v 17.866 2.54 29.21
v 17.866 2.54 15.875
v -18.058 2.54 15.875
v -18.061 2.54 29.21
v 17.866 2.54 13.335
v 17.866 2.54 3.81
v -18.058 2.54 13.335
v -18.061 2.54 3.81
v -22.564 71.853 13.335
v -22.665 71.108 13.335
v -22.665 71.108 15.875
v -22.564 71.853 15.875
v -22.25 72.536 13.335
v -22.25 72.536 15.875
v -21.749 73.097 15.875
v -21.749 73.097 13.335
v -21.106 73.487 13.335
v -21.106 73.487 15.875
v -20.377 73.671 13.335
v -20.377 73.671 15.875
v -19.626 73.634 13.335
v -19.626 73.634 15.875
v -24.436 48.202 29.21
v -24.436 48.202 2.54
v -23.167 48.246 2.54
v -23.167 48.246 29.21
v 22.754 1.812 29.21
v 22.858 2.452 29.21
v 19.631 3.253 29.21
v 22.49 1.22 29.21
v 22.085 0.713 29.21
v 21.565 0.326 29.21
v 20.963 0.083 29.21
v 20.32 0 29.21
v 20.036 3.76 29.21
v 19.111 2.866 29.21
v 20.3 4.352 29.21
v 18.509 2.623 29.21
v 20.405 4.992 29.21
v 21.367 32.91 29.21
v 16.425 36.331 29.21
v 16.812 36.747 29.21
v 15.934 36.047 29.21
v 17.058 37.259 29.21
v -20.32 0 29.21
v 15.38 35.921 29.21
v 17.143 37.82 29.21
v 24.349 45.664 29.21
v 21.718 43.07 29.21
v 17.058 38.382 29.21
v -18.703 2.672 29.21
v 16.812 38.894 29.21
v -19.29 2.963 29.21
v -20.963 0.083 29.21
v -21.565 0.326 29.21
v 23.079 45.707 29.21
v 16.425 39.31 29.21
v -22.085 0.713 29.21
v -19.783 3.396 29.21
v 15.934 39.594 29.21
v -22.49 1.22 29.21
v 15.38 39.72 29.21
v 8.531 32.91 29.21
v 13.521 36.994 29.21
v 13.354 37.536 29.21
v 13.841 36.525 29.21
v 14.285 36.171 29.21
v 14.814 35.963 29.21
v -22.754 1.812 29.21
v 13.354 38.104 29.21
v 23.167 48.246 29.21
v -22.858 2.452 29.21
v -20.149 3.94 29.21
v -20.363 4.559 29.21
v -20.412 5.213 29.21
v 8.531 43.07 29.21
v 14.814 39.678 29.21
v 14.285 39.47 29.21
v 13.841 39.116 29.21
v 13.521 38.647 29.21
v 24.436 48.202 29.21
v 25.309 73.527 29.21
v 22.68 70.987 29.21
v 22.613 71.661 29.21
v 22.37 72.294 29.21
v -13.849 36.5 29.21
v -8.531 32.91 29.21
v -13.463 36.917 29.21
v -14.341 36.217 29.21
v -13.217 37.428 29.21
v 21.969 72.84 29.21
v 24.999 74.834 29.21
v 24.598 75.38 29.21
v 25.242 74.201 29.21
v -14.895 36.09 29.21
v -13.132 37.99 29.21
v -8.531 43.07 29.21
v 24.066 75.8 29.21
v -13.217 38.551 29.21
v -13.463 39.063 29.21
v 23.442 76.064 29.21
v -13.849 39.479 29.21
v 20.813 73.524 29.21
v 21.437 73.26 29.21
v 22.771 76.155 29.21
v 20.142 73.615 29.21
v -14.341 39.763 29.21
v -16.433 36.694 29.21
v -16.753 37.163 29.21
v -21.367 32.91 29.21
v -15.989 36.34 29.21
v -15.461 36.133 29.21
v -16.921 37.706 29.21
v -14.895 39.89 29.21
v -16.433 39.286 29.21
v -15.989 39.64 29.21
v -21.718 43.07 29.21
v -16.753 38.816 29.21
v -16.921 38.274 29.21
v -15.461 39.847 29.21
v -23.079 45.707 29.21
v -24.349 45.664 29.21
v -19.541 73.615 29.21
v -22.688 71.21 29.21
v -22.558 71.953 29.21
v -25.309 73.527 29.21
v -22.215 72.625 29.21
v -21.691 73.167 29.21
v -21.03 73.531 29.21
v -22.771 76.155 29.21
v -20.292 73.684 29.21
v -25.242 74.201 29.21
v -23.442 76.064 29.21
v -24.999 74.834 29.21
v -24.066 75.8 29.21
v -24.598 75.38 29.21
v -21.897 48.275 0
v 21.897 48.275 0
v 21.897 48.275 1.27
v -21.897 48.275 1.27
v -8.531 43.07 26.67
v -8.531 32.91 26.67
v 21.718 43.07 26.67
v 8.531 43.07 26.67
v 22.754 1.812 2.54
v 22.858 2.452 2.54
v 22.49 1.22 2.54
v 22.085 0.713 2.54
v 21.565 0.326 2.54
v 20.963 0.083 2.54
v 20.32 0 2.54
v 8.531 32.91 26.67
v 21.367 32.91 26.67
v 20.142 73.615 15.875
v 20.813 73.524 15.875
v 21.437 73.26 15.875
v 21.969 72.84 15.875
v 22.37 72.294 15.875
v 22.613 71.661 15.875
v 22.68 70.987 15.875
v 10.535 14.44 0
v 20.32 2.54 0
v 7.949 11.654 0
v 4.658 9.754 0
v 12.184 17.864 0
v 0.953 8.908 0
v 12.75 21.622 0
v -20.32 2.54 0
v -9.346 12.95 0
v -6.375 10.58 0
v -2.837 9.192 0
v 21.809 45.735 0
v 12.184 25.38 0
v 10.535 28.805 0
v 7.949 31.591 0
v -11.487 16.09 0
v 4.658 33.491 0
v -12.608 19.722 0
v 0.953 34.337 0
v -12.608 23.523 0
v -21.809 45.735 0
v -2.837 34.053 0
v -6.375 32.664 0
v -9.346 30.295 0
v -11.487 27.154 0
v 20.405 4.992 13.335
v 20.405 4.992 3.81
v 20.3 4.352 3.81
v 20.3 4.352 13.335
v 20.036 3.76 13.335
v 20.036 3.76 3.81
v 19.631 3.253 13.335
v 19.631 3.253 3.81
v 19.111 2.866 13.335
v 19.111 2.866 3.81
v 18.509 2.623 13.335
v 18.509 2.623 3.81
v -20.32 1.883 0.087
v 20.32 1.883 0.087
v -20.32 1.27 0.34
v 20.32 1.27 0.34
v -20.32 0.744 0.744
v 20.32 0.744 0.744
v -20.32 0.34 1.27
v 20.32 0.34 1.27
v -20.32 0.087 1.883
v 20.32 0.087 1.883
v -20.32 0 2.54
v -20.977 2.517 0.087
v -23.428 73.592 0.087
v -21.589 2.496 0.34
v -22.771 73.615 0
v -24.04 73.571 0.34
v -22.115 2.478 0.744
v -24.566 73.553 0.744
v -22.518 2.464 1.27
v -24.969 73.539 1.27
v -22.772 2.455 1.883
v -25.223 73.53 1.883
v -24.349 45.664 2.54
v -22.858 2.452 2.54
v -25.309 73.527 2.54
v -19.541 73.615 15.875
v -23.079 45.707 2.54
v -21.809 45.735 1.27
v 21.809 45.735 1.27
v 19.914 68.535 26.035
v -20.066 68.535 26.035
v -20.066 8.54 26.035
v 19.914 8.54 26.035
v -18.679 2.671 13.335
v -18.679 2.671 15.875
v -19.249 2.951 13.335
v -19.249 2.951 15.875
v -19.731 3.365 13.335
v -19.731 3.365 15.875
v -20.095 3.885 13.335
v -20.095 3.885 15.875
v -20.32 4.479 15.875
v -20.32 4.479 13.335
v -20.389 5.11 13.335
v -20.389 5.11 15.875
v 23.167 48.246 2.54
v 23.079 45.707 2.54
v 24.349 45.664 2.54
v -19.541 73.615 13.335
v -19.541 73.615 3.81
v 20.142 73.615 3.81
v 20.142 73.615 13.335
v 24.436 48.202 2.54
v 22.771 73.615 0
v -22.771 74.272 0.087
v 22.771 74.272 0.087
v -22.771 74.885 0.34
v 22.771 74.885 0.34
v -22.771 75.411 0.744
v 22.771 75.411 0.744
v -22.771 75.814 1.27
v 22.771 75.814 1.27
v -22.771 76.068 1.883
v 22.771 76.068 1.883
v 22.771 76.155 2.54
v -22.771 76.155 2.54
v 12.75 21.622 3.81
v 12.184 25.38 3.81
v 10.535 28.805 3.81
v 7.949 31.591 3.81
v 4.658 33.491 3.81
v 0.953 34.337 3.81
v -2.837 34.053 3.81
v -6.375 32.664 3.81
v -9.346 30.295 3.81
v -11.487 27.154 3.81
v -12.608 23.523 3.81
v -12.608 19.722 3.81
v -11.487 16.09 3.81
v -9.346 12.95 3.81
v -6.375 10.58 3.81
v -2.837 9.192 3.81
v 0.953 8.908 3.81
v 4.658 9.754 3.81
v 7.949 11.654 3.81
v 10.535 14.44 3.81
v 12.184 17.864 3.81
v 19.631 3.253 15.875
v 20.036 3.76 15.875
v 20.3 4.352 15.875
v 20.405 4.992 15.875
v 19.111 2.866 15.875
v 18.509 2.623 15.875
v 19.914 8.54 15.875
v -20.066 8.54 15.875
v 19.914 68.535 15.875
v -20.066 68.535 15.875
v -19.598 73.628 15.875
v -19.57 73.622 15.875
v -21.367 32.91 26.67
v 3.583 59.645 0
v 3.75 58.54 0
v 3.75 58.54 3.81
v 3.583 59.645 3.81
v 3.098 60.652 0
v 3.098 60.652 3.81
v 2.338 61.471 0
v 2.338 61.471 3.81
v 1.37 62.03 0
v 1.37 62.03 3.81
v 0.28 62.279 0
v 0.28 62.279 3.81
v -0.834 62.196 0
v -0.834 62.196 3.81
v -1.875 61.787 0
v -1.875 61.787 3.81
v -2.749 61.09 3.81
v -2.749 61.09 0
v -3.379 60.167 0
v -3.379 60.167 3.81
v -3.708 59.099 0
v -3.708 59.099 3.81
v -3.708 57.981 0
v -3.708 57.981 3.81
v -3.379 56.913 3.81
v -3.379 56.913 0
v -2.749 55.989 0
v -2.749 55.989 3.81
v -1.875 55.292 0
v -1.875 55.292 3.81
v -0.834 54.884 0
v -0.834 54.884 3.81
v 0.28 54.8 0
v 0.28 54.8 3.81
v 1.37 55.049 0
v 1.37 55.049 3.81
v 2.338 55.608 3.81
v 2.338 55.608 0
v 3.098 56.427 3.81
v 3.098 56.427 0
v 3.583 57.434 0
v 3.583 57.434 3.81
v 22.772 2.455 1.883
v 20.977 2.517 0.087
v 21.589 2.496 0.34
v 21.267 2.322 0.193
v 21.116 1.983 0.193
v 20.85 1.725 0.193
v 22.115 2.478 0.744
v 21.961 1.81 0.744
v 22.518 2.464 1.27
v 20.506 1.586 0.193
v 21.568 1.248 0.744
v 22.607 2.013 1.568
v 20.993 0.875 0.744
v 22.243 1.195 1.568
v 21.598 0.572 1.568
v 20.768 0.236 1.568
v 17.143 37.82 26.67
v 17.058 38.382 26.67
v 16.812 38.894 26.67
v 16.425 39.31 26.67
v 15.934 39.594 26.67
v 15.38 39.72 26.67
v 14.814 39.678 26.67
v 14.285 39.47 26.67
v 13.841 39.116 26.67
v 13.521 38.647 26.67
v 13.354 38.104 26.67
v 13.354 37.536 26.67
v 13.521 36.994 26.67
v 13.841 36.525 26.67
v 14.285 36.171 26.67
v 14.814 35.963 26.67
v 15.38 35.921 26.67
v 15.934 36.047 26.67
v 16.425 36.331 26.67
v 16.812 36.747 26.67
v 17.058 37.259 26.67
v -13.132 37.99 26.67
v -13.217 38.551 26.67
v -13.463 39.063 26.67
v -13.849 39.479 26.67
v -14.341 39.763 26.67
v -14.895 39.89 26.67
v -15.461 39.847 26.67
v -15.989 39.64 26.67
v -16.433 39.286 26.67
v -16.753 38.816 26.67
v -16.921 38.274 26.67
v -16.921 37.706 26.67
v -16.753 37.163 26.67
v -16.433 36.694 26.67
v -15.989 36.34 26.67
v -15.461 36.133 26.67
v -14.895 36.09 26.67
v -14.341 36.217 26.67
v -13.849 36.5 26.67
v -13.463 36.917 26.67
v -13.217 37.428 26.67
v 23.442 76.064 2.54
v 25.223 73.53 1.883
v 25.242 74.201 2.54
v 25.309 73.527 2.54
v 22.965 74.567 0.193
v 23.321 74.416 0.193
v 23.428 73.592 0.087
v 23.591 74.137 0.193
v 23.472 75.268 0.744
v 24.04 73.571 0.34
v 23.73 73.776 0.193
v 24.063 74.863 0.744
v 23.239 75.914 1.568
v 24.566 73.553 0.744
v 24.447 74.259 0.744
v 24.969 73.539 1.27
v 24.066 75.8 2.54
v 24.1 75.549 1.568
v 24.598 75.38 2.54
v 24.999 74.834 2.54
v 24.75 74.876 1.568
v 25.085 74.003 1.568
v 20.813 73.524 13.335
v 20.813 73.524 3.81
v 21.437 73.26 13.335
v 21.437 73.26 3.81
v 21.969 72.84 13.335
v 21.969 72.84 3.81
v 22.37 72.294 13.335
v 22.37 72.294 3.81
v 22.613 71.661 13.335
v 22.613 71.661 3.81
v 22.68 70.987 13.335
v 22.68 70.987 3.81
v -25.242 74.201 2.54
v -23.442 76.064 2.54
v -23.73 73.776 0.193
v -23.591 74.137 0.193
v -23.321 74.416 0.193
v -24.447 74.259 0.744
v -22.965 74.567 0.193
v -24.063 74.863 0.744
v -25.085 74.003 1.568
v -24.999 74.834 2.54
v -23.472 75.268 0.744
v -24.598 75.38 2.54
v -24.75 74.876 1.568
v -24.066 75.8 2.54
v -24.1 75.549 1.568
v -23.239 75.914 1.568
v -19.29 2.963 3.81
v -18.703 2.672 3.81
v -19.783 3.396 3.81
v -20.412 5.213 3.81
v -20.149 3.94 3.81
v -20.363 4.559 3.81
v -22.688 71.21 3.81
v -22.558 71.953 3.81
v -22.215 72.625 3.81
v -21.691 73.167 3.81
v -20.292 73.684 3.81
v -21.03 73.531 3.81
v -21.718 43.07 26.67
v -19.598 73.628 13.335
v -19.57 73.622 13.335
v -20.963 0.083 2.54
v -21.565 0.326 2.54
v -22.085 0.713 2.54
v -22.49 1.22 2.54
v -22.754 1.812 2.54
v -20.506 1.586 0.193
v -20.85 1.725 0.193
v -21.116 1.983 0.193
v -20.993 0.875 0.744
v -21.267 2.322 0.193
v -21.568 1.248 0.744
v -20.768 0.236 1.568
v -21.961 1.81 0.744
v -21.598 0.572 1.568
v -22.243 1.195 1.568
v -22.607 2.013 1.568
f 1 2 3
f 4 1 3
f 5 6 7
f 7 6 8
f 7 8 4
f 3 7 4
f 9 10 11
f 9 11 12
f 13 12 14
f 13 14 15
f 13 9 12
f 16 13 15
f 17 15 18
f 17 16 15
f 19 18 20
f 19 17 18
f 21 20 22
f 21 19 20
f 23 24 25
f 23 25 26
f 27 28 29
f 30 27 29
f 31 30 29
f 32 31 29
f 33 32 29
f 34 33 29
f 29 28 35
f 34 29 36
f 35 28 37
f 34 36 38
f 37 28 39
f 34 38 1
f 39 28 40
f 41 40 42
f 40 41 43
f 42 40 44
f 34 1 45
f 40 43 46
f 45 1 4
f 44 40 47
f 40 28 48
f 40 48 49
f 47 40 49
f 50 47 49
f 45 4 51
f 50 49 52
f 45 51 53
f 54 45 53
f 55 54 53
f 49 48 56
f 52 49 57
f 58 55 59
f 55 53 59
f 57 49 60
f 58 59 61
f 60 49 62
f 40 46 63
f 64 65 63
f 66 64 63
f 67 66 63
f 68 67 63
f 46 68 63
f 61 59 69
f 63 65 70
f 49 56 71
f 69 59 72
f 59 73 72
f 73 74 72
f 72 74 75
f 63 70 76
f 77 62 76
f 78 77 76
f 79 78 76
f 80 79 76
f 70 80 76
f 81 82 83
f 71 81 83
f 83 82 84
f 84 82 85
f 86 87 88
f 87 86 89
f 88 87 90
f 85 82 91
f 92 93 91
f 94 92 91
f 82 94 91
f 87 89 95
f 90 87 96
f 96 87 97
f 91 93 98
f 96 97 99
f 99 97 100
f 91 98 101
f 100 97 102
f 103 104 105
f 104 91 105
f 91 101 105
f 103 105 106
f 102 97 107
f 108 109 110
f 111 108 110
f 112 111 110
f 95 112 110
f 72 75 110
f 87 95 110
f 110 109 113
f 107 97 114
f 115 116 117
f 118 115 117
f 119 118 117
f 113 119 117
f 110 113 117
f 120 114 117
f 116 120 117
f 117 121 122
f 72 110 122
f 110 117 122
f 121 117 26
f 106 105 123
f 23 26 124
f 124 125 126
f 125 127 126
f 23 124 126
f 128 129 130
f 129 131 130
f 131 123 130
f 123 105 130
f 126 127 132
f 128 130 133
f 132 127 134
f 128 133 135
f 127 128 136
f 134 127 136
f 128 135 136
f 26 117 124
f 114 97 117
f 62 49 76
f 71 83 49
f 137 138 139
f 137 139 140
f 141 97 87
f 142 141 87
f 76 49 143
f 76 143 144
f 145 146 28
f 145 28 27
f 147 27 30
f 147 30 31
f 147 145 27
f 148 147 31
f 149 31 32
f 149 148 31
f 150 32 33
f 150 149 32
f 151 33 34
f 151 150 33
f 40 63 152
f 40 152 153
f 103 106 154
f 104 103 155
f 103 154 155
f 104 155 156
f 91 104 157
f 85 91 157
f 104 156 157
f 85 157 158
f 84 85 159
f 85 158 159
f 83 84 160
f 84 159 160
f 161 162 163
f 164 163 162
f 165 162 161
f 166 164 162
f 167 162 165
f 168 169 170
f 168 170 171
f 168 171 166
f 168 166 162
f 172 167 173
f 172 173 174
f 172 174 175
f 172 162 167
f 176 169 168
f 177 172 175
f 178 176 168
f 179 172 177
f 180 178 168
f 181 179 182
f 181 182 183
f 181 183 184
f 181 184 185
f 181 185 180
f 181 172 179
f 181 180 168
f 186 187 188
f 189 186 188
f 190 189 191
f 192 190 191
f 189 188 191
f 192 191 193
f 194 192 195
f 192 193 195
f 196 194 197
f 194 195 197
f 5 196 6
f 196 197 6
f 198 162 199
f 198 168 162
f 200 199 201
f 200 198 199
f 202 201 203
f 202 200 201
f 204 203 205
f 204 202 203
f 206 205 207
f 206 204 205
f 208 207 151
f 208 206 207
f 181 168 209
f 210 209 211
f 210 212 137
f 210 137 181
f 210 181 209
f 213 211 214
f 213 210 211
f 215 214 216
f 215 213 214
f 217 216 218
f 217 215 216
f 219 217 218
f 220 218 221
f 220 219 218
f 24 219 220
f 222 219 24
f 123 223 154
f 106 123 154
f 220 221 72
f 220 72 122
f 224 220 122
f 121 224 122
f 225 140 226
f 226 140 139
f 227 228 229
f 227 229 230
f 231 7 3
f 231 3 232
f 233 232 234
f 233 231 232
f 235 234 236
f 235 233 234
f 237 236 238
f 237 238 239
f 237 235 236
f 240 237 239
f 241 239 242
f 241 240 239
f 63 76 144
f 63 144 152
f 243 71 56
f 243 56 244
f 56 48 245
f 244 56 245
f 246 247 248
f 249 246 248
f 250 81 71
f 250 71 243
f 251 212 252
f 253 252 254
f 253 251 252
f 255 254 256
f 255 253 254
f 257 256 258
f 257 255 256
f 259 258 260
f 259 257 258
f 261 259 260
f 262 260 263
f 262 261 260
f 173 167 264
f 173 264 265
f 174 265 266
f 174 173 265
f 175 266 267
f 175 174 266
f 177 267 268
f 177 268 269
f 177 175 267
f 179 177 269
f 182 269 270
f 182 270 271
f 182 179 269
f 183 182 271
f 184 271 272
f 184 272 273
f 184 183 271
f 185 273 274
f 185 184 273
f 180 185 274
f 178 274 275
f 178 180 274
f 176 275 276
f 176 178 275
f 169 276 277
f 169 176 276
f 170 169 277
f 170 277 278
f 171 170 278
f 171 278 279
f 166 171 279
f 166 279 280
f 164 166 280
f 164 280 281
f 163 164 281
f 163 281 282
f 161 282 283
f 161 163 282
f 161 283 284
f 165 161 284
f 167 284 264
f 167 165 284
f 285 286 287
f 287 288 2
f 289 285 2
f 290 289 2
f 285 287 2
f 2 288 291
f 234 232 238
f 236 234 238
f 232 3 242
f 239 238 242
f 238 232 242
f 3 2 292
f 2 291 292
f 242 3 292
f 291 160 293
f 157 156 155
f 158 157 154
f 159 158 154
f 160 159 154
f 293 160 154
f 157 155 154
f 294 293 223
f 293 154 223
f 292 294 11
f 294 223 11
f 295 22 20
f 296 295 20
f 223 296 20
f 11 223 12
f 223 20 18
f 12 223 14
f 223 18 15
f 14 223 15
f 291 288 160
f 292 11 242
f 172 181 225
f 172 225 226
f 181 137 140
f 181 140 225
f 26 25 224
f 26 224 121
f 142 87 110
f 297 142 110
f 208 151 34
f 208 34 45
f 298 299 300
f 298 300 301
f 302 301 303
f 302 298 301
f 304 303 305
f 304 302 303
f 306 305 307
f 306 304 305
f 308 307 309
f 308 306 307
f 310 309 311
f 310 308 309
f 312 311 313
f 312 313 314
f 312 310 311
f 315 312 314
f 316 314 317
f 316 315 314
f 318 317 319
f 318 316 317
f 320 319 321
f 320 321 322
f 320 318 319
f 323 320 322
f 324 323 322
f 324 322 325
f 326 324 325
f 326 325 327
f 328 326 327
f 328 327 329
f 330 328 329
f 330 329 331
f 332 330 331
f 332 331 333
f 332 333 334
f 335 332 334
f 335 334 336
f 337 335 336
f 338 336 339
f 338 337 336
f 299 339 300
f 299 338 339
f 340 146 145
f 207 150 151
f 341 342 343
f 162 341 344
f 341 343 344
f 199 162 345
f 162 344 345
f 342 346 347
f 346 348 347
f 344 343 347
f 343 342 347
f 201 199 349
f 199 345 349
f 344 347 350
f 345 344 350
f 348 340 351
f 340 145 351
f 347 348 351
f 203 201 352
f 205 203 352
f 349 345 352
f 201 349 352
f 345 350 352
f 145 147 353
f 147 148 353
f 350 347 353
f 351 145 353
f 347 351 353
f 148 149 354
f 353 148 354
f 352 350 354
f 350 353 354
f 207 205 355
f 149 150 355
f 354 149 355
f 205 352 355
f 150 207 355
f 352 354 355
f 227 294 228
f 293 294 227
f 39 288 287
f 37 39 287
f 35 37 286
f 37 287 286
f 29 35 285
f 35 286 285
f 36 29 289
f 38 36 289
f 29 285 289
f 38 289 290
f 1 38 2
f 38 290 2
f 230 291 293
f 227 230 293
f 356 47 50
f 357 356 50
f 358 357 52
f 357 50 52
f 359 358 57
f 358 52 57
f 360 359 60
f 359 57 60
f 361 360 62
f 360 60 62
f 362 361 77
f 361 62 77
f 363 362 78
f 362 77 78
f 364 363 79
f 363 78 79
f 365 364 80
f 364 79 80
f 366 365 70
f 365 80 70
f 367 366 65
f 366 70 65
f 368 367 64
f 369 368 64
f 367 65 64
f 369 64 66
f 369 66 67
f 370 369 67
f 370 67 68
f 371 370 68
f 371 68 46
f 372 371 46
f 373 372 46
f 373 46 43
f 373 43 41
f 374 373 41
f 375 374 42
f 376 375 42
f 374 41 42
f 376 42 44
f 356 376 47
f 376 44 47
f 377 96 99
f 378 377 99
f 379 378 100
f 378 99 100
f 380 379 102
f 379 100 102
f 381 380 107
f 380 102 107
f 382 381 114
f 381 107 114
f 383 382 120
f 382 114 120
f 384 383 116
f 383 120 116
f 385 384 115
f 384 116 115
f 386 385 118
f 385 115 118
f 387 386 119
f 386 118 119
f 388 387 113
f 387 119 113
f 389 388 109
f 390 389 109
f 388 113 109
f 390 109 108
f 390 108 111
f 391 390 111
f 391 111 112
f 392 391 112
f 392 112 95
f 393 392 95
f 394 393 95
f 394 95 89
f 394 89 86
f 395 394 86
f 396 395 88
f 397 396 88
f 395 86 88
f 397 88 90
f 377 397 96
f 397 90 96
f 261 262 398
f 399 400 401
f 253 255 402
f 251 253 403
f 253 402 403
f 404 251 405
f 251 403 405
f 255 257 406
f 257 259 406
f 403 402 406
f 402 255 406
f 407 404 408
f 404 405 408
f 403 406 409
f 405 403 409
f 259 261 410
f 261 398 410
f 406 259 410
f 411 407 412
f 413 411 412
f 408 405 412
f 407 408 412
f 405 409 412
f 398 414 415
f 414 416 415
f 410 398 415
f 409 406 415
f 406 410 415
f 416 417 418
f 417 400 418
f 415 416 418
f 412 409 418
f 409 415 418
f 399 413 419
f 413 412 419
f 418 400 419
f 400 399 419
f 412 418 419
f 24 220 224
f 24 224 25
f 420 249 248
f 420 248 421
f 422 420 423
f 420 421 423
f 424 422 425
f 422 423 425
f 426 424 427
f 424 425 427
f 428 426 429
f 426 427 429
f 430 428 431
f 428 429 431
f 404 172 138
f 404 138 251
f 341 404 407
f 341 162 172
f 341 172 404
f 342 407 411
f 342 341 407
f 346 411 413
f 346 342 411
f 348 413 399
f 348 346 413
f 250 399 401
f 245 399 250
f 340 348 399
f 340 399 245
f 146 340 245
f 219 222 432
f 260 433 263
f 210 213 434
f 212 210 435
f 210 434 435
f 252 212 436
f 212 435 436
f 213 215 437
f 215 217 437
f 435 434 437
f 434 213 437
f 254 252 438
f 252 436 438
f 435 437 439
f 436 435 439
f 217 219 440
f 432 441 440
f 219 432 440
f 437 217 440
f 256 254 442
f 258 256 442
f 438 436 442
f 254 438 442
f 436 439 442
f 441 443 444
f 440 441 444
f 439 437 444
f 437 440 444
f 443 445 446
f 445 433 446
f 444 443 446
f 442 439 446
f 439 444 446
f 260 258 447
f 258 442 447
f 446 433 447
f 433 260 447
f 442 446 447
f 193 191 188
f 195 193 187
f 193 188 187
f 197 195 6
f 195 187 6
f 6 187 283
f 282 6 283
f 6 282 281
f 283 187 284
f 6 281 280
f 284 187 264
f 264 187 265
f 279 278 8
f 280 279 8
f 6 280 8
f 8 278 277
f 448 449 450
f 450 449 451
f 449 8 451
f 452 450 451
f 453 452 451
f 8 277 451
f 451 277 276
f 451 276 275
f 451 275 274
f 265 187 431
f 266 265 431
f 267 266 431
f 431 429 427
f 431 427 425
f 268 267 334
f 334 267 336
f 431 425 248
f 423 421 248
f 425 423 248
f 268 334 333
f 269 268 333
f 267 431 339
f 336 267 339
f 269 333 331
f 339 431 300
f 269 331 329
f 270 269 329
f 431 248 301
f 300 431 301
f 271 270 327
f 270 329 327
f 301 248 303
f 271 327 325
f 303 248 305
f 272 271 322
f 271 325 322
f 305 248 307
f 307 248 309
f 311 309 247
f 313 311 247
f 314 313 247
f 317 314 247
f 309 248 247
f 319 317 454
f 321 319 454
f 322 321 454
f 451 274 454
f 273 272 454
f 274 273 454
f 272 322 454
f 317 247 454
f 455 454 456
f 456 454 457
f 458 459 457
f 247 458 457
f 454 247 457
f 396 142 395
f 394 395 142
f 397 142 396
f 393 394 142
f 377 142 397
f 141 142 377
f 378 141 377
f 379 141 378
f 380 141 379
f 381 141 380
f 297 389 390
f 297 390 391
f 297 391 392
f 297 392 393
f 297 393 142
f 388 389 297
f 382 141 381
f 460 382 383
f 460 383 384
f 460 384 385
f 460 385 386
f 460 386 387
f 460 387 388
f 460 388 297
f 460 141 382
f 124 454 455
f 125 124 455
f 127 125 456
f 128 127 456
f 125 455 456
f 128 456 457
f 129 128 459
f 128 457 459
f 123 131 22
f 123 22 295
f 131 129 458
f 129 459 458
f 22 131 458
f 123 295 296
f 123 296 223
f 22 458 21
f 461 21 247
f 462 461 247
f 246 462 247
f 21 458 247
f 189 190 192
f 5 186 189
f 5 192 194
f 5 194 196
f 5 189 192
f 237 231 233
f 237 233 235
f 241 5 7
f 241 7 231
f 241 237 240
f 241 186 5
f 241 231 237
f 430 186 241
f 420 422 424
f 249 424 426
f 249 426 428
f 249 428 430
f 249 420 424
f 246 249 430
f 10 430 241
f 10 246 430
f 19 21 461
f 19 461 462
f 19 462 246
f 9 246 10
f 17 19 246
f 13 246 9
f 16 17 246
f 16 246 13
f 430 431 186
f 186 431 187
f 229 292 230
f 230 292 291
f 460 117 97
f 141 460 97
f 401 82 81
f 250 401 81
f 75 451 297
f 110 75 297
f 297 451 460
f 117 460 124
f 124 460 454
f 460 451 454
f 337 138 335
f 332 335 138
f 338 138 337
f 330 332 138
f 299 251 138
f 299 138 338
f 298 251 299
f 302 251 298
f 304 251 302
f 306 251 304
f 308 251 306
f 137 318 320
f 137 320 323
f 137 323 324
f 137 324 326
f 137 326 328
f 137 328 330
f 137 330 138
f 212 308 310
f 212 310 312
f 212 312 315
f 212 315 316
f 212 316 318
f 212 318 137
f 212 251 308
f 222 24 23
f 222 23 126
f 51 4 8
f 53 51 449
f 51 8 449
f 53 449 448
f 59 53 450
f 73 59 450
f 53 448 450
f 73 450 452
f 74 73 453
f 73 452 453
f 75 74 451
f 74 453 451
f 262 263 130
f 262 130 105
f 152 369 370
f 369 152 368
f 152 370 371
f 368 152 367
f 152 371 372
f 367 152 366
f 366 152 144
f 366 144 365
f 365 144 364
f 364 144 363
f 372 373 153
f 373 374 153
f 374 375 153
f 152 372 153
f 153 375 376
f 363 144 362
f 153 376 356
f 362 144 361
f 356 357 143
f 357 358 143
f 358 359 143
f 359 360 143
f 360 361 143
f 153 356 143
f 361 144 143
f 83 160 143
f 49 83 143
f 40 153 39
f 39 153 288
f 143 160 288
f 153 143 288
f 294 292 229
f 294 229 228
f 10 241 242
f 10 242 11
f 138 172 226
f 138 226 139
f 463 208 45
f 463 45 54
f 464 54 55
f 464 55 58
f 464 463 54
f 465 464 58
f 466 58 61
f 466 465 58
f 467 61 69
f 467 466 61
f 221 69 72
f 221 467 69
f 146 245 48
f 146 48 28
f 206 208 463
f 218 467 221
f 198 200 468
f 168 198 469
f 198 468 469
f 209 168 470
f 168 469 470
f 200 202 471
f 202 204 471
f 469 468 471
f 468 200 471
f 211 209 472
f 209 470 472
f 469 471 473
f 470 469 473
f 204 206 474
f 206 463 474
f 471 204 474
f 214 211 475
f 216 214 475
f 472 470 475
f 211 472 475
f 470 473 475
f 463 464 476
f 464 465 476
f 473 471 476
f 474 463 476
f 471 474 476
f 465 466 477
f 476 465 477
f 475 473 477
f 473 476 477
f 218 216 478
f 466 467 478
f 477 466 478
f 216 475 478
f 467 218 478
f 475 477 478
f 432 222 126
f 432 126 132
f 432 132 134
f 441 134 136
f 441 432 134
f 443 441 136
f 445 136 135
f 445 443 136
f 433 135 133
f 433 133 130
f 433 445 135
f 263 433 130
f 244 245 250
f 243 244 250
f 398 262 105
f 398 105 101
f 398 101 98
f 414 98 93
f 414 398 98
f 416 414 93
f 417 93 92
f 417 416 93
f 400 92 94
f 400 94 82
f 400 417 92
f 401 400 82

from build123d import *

# Parameters (mm, degrees)
SKETCH1_R           = 3.75
SKETCH1_R_2         = 12.75
BOSS_EXTRUDE1_DEPTH = 3.81
BOSS_EXTRUDE3_DEPTH = 25.4
BOSS_EXTRUDE4_DEPTH = 2.54
FILLET1_R           = 2.54
BOSS_EXTRUDE6_DEPTH = 2.54
SKETCH9_R           = 1.905
CUT_EXTRUDE1_DEPTH  = 2.54
CUT_EXTRUDE2_DEPTH  = 1.27
SKETCH11_W          = 26.67
SKETCH11_H          = 2.54
CUT_EXTRUDE3_DEPTH  = 1.27
SKETCH12_W          = 26.67
SKETCH12_H          = 2.54
CUT_EXTRUDE4_DEPTH  = 1.27
SKETCH13_W          = 39.9796
SKETCH13_H          = 59.9948
BOSS_EXTRUDE7_DEPTH = 10.16


with BuildPart() as part:
    # Sketch1 → Boss-Extrude1 (new body)
    with BuildSketch(Plane.XY):
        with BuildLine():
            Line((-22.77090231, 76.154735329), (22.77090231, 76.154735329))
            ThreePointArc((22.77090231, 76.154735329), (24.597640016, 75.379566583), (25.309393487, 73.527199387))
            Line((25.309393487, 73.527199387), (22.858491178, 2.452464058))
            ThreePointArc((22.858491178, 2.452464058), (22.084831254, 0.713262294), (20.32, 0))
            Line((20.32, 0), (-20.32, 0))
            ThreePointArc((-20.32, 0), (-22.084831254, 0.713262294), (-22.858491178, 2.452464058))
            Line((-22.858491178, 2.452464058), (-25.309393487, 73.527199387))
            ThreePointArc((-25.309393487, 73.527199387), (-24.597640016, 75.379566583), (-22.77090231, 76.154735329))
        make_face()
        with Locations((0, 58.539610149)):
            Circle(SKETCH1_R, mode=Mode.SUBTRACT)
        with Locations((0, 21.622308918)):
            Circle(SKETCH1_R_2, mode=Mode.SUBTRACT)
    extrude(amount=BOSS_EXTRUDE1_DEPTH)

    # Sketch4 → Boss-Extrude3 (add)
    with BuildSketch(Plane.XY.offset(3.81)):
        with BuildLine():
            Line((-22.77090231, 76.154735329), (22.77090231, 76.154735329))
            ThreePointArc((22.77090231, 76.154735329), (24.597640016, 75.379566583), (25.309393487, 73.527199387))
            Line((25.309393487, 73.527199387), (22.858491178, 2.452464058))
            ThreePointArc((22.858491178, 2.452464058), (22.084831254, 0.713262294), (20.32, 0))
            Line((20.32, 0), (-20.32, 0))
            ThreePointArc((-20.32, 0), (-22.084831254, 0.713262294), (-22.858491178, 2.452464058))
            Line((-22.858491178, 2.452464058), (-25.309393487, 73.527199387))
            ThreePointArc((-25.309393487, 73.527199387), (-24.597640016, 75.379566583), (-22.77090231, 76.154735329))
        make_face()
        with BuildLine():
            Line((-19.541270744, 73.614735329), (20.141804619, 73.614735329))
            ThreePointArc((20.141804619, 73.614735329), (21.968542325, 72.839566583), (22.680295797, 70.987199387))
            Line((22.680295797, 70.987199387), (20.404569365, 4.992462187))
            ThreePointArc((20.404569365, 4.992462187), (19.630909441, 3.253260423), (17.866078187, 2.539998129))
            Line((17.866078187, 2.539998129), (-18.061159176, 2.539998129))
            ThreePointArc((-18.061159176, 2.539998129), (-19.78310781, 3.39559701), (-20.412160003, 5.212586245))
            Line((-20.412160003, 5.212586245), (-22.687990425, 71.210339105))
            ThreePointArc((-22.687990425, 71.210339105), (-21.690891162, 73.166710129), (-19.541270744, 73.614735329))
        make_face(mode=Mode.SUBTRACT)
    extrude(amount=BOSS_EXTRUDE3_DEPTH)

    # Sketch7 → Boss-Extrude4 (add)
    with BuildSketch(Plane.XY.offset(13.335)):
        with BuildLine():
            Line((-19.537731311, 73.614735329), (20.145344052, 73.614735329))
            ThreePointArc((20.145344052, 73.614735329), (21.972081758, 72.839566583), (22.68383523, 70.987199387))
            Line((22.68383523, 70.987199387), (20.408108798, 4.992462187))
            ThreePointArc((20.408108798, 4.992462187), (19.634448874, 3.253260423), (17.86961762, 2.539998129))
            Line((17.86961762, 2.539998129), (-18.057619743, 2.539998129))
            ThreePointArc((-18.057619743, 2.539998129), (-19.730779532, 3.364707915), (-20.389382819, 5.109944754))
            Line((-20.389382819, 5.109944754), (-22.665213241, 71.107697614))
            ThreePointArc((-22.665213241, 71.107697614), (-21.714144758, 73.125513756), (-19.537731311, 73.614735329))
        make_face()
    extrude(amount=BOSS_EXTRUDE4_DEPTH)

    # Fillet1
    fillet1_edges = [part.edges().sort_by_distance(p)[0] for p in [
        (-22.084831254, 0.713262294, 0),
        (-24.083942332, 37.989831723, 0),
        (-24.597640016, 75.379566583, 0),
        (0, 76.154735329, 0),
        (24.597640016, 75.379566583, 0),
        (24.083942332, 37.989831723, 0),
        (22.084831254, 0.713262294, 0),
        (0, 0, 0),
    ]]
    fillet(fillet1_edges, radius=FILLET1_R)

    # Sketch8 → Boss-Extrude6 (add)
    with BuildSketch(Plane.XY.offset(29.21)):
        Polygon((-21.717608556, 43.069831723), (-8.531459132, 43.069831723), (-8.531459132, 32.909831723), (-21.367256671, 32.909831723), align=None)
        Polygon((8.531459132, 32.909831723), (21.367256671, 32.909831723), (21.717608556, 43.069831723), (8.531459132, 43.069831723), align=None)
    extrude(amount=-BOSS_EXTRUDE6_DEPTH)

    # Sketch9 → Cut-Extrude1 (cut)
    with BuildSketch(Plane.XY.offset(29.21)):
        with Locations((-15.036945873, 37.989831723)):
            Circle(SKETCH9_R)
        with Locations((15.237744036, 37.820383377)):
            Circle(SKETCH9_R)
    extrude(amount=-CUT_EXTRUDE1_DEPTH, mode=Mode.SUBTRACT)

    # Sketch10 → Cut-Extrude2 (cut)
    with BuildSketch(Plane(origin=(0, 0, 0), x_dir=(-1, 0, 0), z_dir=(0, 0, -1))):
        Polygon((-21.897084176, 48.274519863), (21.897084176, 48.274519863), (21.809496204, 45.734519863), (-21.809496204, 45.734519863), align=None)
    extrude(amount=-CUT_EXTRUDE2_DEPTH, mode=Mode.SUBTRACT)

    # Sketch11 → Cut-Extrude3 (cut)
    with BuildSketch(Plane(origin=(-22.746873247, -0.784390739, 0), x_dir=(0, 0, 1), z_dir=(-0.999405975, -0.034462969, 0))):
        with Locations((15.875, 47.745550873)):
            Rectangle(SKETCH11_W, SKETCH11_H)
    extrude(amount=-CUT_EXTRUDE3_DEPTH, mode=Mode.SUBTRACT)

    # Sketch12 → Cut-Extrude4 (cut)
    with BuildSketch(Plane(origin=(22.746873247, -0.784390739, 0), x_dir=(0, 0, -1), z_dir=(0.999405975, -0.034462969, 0))):
        with Locations((-15.875, 47.745550873)):
            Rectangle(SKETCH12_W, SKETCH12_H)
    extrude(amount=-CUT_EXTRUDE4_DEPTH, mode=Mode.SUBTRACT)

    # Sketch13 → Boss-Extrude7 (add)
    with BuildSketch(Plane.XY.offset(15.875)):
        with Locations((-0.0762, 38.537335329)):
            Rectangle(SKETCH13_W, SKETCH13_H)
    extrude(amount=BOSS_EXTRUDE7_DEPTH)


solid = part.part
